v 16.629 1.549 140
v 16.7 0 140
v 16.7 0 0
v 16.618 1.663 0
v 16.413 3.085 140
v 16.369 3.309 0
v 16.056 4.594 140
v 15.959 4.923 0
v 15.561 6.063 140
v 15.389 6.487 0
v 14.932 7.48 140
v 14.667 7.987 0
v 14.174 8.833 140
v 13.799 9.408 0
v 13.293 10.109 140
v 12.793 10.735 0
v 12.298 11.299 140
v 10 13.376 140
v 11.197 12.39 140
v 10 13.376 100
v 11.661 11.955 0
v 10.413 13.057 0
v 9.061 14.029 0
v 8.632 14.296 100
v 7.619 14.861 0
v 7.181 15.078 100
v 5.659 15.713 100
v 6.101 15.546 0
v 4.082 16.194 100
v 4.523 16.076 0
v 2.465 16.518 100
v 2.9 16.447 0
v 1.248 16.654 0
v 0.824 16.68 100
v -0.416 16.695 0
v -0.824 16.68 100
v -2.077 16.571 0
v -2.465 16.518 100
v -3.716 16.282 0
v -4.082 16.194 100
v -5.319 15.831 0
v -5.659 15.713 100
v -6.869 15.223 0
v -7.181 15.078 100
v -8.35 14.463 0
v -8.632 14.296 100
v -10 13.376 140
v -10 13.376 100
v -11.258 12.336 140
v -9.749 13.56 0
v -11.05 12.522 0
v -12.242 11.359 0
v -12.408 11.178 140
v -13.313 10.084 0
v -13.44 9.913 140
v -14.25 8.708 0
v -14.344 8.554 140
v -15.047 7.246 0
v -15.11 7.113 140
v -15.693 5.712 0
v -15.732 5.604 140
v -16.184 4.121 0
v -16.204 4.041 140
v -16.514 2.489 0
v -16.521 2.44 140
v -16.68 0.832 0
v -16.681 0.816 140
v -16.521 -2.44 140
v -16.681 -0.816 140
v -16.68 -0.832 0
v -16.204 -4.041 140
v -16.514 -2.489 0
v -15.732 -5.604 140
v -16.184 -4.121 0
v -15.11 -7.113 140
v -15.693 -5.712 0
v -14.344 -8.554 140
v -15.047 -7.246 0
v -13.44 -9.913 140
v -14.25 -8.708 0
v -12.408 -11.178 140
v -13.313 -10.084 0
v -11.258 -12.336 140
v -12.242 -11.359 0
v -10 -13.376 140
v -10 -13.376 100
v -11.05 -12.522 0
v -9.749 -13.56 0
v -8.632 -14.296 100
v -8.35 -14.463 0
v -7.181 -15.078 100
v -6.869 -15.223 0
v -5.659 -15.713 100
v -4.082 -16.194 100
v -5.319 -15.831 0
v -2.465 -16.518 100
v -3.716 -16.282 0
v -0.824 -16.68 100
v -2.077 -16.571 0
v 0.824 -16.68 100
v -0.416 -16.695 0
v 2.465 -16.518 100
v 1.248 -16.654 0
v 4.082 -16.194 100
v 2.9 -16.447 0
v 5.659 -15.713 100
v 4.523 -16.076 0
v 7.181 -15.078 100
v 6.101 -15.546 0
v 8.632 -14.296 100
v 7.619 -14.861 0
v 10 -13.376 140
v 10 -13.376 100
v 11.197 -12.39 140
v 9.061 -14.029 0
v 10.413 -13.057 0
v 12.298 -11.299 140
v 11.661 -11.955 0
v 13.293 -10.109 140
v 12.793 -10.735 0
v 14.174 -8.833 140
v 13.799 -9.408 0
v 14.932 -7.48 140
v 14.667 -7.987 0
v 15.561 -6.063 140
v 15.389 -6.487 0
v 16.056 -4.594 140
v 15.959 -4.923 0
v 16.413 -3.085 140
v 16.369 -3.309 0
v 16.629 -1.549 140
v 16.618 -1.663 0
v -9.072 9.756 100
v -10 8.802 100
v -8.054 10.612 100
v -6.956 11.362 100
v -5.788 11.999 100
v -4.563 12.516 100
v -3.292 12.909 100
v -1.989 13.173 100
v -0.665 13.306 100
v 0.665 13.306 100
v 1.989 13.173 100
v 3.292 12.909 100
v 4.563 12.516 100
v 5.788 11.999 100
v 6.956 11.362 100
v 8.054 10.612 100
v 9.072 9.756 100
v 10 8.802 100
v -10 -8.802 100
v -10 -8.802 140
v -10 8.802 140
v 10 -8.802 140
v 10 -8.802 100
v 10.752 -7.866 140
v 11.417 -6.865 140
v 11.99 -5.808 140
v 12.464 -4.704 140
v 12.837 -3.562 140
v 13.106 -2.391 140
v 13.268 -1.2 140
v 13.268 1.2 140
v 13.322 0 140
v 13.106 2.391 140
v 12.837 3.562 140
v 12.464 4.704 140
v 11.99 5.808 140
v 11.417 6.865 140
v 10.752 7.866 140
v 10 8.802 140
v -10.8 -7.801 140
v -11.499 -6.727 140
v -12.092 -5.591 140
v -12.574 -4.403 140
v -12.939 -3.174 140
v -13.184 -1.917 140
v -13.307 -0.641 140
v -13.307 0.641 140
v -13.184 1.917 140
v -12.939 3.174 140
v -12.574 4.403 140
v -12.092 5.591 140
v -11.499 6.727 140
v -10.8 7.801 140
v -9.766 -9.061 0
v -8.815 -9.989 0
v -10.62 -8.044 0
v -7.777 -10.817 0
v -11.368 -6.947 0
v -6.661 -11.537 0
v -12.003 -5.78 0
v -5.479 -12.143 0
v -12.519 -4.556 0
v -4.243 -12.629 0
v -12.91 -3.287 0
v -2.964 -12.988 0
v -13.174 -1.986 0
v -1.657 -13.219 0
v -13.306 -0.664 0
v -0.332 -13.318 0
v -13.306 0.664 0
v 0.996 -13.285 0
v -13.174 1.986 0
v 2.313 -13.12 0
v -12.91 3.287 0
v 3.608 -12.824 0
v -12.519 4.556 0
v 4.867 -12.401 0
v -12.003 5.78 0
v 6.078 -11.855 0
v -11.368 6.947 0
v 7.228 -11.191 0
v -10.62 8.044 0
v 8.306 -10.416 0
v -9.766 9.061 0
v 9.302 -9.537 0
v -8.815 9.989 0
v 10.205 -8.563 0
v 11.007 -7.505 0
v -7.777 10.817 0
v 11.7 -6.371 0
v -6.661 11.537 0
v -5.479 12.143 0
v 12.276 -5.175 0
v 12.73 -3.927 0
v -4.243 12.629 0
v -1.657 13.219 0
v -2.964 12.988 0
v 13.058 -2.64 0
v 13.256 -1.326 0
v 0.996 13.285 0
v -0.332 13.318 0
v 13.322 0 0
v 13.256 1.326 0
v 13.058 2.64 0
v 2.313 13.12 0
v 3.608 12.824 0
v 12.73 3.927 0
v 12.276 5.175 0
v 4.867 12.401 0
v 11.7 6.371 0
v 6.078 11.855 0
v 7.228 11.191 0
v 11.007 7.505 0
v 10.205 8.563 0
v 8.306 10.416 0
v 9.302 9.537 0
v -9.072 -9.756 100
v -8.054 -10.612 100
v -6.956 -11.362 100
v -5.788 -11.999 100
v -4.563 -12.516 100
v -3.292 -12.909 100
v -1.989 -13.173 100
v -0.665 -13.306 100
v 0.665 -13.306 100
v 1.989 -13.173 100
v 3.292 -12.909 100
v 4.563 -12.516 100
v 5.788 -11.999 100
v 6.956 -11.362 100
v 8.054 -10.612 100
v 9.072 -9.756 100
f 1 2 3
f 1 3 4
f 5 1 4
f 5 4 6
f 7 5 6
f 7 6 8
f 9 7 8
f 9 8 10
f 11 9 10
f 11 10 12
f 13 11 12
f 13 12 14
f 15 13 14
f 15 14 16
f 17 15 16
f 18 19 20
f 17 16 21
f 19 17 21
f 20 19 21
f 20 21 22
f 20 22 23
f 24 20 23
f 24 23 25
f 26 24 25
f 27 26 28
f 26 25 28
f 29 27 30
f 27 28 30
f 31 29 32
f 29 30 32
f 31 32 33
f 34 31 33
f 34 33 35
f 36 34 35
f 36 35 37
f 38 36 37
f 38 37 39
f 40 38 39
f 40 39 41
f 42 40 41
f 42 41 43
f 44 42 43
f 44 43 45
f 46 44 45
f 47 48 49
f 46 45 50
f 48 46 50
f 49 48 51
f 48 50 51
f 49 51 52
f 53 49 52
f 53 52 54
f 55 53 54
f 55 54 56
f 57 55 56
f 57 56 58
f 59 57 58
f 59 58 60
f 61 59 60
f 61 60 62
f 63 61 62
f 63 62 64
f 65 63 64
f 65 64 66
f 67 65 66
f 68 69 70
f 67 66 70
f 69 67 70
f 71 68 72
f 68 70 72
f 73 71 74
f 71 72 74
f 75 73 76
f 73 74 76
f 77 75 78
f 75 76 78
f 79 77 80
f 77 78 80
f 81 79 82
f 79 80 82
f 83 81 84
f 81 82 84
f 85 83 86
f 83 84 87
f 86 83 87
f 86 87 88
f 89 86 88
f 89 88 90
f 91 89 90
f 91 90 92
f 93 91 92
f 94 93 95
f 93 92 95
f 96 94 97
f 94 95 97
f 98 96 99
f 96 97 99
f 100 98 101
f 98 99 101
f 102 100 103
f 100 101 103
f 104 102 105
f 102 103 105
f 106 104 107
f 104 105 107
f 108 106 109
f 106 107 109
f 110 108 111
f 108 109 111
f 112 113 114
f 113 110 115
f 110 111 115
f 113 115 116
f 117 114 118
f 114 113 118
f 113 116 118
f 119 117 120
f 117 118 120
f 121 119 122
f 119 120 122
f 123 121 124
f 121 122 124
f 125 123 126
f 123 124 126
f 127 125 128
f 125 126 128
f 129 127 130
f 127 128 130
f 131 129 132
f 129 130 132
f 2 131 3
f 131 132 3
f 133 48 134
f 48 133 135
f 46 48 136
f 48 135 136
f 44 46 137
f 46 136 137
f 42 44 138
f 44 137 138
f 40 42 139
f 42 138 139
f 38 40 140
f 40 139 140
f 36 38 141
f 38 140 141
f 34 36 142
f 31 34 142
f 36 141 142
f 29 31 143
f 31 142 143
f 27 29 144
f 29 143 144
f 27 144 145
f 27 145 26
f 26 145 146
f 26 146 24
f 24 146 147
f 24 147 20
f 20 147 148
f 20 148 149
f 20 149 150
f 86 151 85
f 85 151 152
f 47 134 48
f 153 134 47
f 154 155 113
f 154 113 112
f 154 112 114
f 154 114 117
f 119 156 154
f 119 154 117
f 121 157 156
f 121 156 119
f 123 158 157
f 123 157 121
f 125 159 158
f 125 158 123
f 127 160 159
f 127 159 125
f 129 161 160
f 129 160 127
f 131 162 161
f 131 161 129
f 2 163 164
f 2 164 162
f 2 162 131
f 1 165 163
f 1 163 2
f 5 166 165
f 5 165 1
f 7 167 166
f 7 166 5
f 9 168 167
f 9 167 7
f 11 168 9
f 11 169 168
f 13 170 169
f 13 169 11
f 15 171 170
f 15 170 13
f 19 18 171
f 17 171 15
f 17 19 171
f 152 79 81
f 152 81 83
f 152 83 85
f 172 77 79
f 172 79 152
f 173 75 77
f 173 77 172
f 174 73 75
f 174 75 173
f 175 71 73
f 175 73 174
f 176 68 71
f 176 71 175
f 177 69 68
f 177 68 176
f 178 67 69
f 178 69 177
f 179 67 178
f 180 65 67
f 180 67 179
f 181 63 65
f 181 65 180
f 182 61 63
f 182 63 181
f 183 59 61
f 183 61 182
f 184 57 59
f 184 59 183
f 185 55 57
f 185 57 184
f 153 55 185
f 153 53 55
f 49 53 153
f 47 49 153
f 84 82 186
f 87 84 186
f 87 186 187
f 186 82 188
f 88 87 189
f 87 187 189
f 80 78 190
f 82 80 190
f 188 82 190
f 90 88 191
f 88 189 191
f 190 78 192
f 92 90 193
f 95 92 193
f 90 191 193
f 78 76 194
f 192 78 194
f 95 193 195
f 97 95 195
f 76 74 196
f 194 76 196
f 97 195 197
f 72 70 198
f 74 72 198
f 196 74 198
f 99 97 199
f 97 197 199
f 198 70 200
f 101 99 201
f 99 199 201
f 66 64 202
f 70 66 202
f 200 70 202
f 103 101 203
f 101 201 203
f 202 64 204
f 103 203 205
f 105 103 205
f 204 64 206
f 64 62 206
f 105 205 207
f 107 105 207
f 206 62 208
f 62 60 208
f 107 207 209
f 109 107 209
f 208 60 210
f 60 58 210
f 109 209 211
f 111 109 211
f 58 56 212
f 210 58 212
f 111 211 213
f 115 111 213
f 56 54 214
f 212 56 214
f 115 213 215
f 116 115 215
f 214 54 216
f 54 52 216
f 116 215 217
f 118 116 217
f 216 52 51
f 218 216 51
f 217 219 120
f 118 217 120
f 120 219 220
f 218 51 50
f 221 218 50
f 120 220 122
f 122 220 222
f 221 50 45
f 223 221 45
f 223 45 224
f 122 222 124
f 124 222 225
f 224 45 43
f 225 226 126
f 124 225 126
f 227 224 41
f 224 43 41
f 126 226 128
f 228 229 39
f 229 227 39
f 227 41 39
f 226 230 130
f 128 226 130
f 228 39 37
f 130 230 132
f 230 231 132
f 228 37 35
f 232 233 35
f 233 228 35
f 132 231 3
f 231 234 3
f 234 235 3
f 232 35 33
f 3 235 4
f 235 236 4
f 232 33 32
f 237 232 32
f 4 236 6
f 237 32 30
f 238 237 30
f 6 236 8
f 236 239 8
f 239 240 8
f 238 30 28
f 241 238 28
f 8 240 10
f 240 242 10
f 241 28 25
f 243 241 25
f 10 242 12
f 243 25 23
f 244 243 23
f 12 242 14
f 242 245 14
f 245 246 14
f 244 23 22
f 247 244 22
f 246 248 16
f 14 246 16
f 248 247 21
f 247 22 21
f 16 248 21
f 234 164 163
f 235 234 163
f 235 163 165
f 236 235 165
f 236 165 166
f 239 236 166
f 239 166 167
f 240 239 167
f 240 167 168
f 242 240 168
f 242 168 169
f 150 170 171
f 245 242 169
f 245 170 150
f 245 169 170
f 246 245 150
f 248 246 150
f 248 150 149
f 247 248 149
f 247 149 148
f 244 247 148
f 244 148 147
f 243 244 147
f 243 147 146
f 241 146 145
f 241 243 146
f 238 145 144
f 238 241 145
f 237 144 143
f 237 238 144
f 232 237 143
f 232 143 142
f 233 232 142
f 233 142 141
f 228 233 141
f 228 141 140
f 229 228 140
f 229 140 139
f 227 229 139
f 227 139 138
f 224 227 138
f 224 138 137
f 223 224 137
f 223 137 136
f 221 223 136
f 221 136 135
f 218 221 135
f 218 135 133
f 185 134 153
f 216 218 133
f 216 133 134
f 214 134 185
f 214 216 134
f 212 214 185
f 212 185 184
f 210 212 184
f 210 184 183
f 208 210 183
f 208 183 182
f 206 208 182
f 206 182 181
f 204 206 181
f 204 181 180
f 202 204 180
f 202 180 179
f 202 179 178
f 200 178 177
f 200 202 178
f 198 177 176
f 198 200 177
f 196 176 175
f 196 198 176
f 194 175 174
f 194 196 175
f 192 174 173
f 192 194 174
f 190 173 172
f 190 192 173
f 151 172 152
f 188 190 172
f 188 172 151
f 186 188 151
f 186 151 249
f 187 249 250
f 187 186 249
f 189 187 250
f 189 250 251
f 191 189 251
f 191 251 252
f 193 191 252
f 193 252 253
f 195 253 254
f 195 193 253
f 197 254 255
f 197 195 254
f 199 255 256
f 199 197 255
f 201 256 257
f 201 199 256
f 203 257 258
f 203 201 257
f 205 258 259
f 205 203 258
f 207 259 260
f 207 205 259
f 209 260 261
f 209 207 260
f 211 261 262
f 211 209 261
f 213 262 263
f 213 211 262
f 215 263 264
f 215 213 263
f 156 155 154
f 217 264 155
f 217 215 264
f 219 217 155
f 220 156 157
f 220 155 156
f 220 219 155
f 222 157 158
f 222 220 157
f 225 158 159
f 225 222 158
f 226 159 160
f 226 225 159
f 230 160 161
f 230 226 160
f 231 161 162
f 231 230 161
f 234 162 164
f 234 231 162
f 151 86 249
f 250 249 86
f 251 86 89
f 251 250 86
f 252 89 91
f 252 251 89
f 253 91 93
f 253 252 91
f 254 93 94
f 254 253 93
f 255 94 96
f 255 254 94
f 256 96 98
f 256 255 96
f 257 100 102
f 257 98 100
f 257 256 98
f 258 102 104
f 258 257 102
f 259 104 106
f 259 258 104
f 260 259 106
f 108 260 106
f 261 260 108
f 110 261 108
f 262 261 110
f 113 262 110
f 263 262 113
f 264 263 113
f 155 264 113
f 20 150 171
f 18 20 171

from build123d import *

# Parameters (mm, degrees)
SKETCH_R          = 16.7005
SKETCH_R_2        = 13.3223
PAD_DEPTH         = 140
SKETCH001_W       = 20
SKETCH001_H       = 40
POCKET_DEPTH      = 16.7015
POCKET_DEPTH_BACK = -16.7015


with BuildPart() as part:
    # Sketch → Pad (new body)
    with BuildSketch(Plane.XY):
        Circle(SKETCH_R)
        Circle(SKETCH_R_2, mode=Mode.SUBTRACT)
    extrude(amount=PAD_DEPTH)

    # Sketch001 → Pocket (cut, two sides)
    with BuildSketch(Plane(origin=(0, 0, 140), x_dir=(1, 0, 0), z_dir=(0, -1, 0))) as pocket_sk:
        with Locations((0, -20)):
            Rectangle(SKETCH001_W, SKETCH001_H)
    extrude(amount=-POCKET_DEPTH, mode=Mode.SUBTRACT)
    extrude(pocket_sk.sketch, amount=-POCKET_DEPTH_BACK, mode=Mode.SUBTRACT)


solid = part.part
